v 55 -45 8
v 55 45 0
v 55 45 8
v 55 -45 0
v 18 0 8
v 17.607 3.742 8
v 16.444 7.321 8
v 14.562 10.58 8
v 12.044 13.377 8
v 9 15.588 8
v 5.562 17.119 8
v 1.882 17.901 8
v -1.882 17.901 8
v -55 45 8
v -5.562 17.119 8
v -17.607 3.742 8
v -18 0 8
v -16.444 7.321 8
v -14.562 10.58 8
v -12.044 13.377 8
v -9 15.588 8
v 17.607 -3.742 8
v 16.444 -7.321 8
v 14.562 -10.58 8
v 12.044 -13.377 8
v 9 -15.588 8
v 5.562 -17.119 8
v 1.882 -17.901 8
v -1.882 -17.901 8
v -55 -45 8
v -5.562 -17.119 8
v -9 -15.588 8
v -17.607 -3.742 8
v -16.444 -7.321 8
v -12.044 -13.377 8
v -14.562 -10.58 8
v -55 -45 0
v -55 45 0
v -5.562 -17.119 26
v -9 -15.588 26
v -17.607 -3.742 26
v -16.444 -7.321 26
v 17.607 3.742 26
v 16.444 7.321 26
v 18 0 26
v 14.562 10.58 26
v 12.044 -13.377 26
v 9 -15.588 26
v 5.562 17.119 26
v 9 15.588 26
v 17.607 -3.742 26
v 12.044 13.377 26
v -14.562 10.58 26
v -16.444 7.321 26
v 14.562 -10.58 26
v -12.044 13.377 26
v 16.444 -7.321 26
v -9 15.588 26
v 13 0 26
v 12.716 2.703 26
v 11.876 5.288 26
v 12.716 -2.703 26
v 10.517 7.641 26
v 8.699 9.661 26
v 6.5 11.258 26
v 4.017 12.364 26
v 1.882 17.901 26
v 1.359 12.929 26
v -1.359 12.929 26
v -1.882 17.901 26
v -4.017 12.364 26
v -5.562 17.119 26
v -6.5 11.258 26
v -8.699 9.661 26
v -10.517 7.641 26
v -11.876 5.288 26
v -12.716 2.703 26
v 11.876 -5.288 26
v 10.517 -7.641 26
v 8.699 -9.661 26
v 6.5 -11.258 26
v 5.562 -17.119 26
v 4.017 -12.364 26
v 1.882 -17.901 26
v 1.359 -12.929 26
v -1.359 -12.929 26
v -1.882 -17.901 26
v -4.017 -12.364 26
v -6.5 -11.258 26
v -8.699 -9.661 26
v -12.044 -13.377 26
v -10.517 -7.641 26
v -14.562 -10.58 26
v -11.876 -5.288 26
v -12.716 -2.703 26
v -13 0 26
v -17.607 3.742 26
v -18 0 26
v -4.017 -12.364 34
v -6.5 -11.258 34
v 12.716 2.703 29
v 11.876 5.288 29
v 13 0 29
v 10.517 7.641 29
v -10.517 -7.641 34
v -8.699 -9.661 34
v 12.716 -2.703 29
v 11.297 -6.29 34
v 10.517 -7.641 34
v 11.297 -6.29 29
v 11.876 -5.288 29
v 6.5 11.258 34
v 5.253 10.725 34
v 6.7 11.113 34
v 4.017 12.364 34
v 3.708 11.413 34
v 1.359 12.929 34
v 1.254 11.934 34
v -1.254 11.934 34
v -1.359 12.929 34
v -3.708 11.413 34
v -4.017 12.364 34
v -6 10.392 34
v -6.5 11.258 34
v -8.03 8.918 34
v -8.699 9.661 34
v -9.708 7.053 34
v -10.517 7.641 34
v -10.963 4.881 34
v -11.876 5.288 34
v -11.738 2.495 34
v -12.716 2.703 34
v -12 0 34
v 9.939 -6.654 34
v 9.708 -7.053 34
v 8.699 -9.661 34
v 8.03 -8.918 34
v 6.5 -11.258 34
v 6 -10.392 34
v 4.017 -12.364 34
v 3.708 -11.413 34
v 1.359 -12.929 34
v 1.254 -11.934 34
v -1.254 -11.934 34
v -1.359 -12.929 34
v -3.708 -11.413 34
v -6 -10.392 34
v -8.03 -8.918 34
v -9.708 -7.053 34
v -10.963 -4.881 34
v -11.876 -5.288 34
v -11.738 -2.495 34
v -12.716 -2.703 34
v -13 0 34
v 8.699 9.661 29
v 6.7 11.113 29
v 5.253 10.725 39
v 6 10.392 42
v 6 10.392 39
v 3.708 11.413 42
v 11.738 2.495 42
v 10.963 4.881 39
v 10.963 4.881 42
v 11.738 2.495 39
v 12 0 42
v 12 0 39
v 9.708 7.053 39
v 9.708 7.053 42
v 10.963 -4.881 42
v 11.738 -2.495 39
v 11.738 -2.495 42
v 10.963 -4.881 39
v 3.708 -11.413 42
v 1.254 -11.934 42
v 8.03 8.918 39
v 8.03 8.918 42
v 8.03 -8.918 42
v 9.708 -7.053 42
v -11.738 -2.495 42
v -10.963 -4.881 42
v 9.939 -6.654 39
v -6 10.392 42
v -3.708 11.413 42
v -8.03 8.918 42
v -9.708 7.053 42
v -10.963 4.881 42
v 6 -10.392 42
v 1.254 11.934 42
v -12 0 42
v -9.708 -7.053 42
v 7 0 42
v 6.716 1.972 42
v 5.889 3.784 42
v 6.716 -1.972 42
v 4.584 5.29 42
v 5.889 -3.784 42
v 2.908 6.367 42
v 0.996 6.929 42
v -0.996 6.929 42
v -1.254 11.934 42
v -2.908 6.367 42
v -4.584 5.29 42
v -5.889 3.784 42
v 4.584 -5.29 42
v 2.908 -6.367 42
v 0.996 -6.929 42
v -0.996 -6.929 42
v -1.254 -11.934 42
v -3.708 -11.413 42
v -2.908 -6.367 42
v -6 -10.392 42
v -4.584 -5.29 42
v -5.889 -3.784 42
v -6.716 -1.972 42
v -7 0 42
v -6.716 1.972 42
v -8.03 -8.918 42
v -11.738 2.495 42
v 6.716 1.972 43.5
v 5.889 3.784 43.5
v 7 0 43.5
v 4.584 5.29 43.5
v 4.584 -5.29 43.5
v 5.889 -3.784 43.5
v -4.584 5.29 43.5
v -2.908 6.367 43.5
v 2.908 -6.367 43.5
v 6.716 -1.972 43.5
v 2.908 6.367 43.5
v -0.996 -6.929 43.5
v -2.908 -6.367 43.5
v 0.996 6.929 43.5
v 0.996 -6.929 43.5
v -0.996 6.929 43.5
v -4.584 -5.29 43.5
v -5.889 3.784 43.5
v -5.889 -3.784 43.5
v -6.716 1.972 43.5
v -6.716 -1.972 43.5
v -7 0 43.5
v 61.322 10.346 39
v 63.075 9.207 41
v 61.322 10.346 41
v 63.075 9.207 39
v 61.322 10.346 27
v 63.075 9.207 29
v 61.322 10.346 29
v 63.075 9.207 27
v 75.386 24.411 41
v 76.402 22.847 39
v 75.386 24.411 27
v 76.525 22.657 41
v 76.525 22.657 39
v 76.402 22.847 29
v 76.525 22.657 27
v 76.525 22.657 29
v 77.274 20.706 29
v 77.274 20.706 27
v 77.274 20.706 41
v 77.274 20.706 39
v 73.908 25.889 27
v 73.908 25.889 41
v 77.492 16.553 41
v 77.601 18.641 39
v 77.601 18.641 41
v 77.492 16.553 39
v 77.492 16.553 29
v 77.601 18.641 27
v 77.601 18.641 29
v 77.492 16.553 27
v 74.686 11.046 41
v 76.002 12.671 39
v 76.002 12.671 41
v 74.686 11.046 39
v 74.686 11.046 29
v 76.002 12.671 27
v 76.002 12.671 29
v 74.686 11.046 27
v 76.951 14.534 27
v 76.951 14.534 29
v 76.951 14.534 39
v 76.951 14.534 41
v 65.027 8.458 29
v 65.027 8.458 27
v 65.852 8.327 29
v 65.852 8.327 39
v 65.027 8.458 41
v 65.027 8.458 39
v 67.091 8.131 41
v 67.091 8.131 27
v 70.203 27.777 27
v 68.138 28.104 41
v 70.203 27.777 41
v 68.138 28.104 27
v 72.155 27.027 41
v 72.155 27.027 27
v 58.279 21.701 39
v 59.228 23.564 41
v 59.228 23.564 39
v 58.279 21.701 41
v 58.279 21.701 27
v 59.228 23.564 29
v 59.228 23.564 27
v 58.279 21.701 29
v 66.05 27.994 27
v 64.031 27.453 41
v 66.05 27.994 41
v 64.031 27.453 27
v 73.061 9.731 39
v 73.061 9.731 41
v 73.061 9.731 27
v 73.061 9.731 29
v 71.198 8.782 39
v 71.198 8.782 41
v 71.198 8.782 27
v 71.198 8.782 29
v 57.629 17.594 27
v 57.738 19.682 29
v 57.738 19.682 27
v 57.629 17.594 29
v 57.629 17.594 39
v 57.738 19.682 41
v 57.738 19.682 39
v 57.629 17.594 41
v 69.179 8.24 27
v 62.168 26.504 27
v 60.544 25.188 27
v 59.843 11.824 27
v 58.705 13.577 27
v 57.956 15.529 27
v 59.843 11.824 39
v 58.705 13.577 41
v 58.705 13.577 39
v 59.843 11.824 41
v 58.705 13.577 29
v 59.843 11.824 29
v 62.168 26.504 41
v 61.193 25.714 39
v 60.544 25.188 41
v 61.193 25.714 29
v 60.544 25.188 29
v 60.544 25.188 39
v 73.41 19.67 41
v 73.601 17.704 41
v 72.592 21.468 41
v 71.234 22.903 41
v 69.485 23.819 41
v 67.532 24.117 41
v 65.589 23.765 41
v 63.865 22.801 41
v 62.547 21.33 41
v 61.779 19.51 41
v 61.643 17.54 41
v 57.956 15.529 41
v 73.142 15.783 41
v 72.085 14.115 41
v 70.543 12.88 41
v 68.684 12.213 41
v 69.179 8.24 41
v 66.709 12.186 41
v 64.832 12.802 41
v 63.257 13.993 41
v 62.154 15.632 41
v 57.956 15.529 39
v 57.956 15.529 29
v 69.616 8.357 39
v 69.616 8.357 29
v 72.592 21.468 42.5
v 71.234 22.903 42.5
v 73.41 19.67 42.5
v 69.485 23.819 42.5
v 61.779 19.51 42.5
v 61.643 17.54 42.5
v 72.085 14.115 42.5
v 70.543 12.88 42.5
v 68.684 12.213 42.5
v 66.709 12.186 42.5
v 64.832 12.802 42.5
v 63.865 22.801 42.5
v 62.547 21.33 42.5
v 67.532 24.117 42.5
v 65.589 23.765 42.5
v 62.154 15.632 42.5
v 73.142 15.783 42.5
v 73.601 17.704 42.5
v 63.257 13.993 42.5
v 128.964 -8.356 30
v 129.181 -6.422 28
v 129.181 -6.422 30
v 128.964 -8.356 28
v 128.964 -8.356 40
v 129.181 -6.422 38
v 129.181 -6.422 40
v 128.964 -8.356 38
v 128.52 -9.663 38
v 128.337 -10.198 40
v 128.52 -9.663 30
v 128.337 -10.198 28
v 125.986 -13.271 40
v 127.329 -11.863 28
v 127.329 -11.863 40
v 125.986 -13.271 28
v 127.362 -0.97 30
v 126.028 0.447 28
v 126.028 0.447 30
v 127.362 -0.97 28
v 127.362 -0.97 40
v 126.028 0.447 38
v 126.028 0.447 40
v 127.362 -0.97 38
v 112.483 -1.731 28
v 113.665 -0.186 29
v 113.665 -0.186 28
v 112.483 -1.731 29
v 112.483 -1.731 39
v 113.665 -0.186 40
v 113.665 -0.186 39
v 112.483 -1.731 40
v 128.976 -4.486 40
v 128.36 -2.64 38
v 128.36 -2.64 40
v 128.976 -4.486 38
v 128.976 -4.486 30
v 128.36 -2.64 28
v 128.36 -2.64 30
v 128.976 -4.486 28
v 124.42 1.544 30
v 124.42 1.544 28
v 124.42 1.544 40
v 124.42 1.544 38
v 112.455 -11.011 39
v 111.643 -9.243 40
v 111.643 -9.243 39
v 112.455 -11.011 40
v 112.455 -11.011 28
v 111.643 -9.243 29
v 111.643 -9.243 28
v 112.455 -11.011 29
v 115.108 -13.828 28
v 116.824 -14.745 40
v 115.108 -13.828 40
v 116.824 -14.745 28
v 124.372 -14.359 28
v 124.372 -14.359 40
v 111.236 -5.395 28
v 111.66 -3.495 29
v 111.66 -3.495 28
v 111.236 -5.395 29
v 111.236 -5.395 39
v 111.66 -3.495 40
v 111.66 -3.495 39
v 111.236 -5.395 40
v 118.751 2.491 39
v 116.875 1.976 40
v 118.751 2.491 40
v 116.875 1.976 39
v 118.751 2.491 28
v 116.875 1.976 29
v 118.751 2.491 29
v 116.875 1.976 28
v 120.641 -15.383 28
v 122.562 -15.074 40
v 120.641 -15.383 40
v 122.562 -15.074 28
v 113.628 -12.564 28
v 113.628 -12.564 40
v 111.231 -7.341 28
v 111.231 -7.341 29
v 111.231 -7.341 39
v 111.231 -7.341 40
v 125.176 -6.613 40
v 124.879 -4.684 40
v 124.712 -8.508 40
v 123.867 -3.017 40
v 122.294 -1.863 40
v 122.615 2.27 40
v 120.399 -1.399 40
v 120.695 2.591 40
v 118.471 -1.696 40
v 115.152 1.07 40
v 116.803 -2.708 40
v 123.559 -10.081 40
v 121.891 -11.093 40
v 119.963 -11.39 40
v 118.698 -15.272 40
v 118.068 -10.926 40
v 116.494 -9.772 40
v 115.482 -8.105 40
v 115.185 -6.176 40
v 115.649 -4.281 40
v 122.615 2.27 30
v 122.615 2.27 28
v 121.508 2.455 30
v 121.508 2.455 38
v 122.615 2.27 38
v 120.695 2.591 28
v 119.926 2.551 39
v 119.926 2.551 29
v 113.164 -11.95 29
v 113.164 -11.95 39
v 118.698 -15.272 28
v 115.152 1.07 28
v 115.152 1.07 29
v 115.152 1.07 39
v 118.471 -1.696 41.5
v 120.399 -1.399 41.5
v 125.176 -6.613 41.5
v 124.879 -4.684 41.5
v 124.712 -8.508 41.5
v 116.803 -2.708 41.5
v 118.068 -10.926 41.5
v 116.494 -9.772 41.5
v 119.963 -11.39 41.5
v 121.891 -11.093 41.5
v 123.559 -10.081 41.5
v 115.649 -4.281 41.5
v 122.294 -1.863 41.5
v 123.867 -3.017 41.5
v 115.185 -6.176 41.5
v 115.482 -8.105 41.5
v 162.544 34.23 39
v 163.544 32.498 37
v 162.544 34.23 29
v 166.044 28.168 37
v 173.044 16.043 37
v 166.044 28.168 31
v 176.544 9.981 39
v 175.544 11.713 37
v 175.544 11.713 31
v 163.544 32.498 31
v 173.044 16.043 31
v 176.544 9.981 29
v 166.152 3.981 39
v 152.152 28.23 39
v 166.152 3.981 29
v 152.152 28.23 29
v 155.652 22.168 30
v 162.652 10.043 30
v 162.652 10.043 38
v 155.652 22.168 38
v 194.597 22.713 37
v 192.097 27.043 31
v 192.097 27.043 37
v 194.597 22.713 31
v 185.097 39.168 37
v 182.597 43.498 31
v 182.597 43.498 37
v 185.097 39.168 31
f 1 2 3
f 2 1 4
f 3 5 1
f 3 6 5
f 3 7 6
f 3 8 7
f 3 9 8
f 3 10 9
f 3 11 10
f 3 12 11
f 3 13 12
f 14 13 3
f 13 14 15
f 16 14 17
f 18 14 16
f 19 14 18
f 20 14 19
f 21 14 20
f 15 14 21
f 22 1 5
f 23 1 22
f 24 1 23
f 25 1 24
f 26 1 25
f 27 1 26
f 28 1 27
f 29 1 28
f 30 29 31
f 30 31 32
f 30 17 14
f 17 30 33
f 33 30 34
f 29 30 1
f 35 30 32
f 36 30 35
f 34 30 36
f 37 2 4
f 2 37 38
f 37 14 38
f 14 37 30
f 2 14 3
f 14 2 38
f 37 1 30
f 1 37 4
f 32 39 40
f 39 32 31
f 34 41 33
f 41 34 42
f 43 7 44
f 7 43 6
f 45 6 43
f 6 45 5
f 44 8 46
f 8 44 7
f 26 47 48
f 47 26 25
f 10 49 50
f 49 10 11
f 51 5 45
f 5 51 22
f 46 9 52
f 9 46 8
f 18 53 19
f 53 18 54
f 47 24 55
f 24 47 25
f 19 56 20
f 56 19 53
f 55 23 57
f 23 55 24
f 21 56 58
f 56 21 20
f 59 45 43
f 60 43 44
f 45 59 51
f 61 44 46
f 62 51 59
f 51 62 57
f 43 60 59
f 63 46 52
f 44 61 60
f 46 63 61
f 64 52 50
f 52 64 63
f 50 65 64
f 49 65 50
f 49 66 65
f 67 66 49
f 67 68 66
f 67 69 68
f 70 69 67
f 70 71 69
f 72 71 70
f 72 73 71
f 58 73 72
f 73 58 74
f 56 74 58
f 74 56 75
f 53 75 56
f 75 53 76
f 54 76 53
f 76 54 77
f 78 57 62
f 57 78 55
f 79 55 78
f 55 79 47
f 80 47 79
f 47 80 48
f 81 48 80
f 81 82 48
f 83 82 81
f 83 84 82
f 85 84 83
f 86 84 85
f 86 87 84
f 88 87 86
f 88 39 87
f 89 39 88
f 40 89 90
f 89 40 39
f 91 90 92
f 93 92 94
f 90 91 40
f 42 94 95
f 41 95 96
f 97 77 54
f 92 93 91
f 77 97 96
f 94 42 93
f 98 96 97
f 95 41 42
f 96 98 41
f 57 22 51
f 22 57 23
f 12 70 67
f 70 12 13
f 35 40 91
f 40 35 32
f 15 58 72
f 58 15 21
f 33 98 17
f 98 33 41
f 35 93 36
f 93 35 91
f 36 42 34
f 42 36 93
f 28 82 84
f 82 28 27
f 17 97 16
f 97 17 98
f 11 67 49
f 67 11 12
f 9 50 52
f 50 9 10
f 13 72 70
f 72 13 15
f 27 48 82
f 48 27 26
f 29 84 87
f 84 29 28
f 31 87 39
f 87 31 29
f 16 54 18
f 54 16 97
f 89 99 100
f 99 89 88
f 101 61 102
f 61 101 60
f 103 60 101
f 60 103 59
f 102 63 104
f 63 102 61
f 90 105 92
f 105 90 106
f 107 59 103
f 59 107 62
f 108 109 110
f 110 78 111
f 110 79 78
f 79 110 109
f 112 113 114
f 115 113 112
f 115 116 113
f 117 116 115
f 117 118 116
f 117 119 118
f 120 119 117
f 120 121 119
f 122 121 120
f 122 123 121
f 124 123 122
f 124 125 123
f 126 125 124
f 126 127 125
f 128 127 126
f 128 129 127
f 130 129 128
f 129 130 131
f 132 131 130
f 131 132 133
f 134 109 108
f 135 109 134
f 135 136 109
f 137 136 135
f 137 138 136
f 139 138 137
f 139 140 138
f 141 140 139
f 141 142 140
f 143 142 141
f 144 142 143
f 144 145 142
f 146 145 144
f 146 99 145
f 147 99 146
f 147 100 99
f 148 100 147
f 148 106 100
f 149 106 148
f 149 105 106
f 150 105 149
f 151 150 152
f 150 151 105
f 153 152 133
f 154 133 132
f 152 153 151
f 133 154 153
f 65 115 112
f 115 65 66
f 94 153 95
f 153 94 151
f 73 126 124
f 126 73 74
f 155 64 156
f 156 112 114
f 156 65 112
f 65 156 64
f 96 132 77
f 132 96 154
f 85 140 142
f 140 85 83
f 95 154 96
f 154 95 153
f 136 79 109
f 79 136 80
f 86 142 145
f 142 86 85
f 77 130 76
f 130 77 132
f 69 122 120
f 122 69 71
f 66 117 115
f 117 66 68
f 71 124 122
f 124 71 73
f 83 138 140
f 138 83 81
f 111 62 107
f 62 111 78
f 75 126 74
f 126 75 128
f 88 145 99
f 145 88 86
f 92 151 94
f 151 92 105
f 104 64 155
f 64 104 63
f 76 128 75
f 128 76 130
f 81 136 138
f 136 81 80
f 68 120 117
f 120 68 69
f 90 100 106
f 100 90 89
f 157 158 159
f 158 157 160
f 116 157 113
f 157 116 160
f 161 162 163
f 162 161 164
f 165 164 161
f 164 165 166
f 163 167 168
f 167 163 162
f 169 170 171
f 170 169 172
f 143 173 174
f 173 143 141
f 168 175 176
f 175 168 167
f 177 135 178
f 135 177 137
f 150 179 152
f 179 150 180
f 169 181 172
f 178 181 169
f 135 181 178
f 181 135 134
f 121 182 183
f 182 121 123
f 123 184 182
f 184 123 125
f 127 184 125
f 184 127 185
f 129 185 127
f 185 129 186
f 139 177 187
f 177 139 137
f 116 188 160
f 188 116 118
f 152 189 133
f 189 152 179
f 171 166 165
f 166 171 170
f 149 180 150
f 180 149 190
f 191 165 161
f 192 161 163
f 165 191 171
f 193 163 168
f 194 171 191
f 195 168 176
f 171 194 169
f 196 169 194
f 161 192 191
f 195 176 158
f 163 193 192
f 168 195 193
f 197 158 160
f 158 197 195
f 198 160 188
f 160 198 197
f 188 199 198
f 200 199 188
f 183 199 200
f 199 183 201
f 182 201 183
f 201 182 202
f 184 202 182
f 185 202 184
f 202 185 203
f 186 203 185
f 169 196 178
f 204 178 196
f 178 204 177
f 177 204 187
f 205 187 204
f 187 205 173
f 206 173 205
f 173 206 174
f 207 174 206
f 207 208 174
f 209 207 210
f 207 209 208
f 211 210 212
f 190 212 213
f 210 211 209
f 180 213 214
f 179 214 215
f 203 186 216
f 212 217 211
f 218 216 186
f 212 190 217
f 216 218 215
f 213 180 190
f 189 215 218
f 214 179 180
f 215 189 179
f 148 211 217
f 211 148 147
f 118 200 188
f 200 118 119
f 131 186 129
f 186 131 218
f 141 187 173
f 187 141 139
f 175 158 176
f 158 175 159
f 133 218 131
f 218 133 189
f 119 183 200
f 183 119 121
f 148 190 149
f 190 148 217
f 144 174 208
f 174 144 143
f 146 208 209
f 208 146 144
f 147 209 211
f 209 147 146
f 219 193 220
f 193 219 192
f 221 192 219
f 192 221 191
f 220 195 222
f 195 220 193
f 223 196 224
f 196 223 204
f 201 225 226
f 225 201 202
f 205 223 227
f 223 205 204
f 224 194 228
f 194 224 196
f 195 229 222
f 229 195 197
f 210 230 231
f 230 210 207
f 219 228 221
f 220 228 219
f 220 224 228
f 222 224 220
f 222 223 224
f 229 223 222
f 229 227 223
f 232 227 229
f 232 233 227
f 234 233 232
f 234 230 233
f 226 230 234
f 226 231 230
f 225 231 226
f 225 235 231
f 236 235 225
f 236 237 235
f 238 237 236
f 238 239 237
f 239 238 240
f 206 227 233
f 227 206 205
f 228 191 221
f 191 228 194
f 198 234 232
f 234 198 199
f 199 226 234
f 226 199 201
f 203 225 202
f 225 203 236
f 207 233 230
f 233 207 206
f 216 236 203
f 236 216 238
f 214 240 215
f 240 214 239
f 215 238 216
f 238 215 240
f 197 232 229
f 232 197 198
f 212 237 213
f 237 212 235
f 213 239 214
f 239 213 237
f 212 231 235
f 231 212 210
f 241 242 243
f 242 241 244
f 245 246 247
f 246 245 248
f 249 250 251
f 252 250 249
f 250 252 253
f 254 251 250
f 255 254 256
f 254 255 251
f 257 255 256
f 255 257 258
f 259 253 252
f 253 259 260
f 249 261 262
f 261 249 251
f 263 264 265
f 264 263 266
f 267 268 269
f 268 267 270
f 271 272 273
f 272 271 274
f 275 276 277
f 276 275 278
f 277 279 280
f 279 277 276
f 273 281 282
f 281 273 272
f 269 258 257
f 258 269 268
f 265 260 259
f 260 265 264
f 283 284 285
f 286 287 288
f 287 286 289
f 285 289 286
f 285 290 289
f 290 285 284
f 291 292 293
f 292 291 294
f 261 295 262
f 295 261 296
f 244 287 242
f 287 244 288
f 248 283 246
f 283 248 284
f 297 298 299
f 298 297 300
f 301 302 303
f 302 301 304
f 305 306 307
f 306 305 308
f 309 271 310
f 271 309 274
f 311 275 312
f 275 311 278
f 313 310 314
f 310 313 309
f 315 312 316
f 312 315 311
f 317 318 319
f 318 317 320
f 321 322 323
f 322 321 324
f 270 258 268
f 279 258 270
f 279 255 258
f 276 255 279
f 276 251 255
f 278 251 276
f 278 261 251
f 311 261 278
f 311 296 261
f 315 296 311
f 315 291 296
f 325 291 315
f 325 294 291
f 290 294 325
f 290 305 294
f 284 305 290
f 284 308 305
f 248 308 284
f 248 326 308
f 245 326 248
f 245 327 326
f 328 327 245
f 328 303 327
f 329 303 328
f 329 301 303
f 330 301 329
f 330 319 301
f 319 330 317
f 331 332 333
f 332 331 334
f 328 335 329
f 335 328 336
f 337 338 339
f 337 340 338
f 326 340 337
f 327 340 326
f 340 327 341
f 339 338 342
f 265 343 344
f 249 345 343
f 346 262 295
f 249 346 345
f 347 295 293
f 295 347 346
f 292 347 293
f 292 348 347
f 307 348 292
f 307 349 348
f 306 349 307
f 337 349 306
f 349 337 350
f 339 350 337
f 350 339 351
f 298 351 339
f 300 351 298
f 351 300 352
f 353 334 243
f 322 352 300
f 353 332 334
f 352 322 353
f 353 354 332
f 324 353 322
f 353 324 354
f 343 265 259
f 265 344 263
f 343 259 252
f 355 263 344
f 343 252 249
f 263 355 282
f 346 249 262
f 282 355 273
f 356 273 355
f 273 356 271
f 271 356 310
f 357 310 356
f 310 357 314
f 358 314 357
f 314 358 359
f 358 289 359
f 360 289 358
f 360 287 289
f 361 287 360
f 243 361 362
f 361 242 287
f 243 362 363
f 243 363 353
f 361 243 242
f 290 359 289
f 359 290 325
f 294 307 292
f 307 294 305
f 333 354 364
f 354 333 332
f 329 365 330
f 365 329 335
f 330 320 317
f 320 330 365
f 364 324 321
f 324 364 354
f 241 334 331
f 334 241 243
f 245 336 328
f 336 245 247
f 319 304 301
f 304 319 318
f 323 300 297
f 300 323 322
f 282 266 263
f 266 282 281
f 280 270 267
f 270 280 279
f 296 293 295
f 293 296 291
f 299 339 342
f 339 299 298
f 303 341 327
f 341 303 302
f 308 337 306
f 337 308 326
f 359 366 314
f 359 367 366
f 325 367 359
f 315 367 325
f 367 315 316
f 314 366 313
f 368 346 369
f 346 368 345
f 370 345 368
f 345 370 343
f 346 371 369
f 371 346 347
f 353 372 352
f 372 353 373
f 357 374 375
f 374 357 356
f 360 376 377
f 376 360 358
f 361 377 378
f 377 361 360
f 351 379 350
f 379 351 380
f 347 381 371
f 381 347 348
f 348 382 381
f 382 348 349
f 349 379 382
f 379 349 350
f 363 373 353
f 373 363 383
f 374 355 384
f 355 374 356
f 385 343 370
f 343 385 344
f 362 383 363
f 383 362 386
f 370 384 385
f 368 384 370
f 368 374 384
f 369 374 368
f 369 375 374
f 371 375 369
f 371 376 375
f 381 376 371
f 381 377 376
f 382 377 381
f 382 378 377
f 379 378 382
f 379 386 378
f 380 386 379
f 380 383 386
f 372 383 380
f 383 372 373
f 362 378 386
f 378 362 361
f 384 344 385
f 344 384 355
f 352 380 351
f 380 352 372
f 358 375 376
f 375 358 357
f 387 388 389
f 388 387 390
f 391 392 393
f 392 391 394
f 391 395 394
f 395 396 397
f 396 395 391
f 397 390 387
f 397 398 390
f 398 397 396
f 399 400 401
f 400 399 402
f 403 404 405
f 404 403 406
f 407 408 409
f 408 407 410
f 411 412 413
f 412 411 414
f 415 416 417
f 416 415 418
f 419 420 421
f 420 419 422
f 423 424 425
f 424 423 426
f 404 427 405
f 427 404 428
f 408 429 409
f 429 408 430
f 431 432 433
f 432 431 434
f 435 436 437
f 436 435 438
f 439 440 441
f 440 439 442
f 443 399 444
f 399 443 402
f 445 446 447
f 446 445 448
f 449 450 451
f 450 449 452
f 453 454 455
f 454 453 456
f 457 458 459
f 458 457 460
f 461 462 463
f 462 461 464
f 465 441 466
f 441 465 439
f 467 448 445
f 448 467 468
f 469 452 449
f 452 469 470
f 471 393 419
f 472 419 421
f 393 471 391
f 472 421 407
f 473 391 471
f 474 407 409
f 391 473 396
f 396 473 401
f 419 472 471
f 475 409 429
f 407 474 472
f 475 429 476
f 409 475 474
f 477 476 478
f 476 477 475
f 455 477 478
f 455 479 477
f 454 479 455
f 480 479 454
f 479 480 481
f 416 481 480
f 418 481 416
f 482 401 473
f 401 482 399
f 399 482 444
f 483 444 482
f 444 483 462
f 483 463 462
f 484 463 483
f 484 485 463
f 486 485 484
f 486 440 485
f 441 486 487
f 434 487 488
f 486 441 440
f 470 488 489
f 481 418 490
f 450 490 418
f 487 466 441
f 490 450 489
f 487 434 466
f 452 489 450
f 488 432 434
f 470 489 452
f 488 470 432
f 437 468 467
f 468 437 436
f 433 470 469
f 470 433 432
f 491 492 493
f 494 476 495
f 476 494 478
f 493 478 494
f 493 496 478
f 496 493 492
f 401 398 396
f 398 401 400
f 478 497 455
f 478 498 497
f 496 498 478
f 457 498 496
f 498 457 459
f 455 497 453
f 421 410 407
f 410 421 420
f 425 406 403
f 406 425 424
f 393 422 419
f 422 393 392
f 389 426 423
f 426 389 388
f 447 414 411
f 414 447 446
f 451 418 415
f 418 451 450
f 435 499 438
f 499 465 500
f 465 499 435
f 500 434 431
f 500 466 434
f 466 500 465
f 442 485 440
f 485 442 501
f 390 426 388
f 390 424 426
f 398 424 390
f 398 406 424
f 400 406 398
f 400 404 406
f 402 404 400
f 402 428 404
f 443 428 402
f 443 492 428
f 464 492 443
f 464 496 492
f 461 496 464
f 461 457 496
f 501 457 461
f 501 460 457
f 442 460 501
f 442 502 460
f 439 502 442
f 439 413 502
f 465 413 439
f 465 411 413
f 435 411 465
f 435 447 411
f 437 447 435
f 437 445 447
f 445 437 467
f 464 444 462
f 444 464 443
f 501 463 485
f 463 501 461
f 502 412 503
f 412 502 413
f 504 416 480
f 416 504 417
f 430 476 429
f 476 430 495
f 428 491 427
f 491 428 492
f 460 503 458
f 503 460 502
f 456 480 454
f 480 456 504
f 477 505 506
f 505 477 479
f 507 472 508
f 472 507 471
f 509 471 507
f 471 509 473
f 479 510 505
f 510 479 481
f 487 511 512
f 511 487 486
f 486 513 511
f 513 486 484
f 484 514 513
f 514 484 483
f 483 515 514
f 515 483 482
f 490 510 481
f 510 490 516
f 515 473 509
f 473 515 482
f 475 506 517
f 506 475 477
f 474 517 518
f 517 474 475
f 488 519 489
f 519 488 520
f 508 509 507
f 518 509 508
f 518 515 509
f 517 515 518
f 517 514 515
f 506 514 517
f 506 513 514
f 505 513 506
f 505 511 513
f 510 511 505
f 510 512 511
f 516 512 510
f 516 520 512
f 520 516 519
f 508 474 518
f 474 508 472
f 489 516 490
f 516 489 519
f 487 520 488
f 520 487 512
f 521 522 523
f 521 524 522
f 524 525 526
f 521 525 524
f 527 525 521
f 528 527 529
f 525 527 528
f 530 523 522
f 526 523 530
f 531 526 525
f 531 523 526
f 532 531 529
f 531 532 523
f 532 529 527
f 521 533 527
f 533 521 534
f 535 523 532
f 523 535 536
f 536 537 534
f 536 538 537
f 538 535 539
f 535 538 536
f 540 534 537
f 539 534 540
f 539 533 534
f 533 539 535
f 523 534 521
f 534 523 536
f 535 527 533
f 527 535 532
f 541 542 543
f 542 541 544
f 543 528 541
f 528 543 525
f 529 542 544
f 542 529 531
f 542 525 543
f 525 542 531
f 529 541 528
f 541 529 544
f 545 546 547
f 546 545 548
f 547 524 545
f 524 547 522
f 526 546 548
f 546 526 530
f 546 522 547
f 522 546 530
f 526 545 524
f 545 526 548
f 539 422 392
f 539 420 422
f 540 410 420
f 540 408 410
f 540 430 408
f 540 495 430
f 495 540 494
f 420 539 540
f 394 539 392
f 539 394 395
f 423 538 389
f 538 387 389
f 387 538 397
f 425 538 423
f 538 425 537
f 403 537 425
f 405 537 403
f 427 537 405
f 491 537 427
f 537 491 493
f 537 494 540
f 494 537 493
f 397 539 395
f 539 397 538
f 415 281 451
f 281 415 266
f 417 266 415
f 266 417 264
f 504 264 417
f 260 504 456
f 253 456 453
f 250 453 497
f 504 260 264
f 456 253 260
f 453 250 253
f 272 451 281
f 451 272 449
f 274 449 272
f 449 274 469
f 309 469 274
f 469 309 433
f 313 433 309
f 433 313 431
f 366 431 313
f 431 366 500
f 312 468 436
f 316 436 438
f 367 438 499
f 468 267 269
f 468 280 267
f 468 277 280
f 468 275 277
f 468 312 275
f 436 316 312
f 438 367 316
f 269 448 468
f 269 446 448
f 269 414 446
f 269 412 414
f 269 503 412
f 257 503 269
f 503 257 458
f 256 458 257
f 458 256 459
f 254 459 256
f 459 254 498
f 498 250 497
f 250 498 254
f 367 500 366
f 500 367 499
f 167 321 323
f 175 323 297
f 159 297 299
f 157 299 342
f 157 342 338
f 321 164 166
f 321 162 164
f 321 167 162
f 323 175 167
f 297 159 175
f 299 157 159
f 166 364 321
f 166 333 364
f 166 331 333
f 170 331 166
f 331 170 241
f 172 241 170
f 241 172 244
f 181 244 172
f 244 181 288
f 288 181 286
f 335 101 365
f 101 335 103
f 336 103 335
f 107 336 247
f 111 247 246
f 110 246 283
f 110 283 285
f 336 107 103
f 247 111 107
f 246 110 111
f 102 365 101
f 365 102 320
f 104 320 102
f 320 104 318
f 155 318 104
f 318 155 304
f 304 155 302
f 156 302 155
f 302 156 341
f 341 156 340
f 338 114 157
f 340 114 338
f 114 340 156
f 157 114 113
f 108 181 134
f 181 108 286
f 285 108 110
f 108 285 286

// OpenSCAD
module base() {
    translate([-55, -45, 0])
        cube([110, 90, 8]);
    translate([0, 0, 8])
        cylinder(r=18, h=18);
    translate([0, 0, 26])
        cylinder(r=13, h=8);
}

module link1() {
    translate([0, -9, -5])
        cube([70, 18, 10]);
}

module link2() {
    translate([0, -8, -5])
        cube([58, 16, 10]);
}

module link3() {
    translate([0, -7, -4])
        cube([45, 14, 8]);
}

module joint1() {
    cylinder(r=12, h=16, center=true);
    translate([0, 0, 8])
        cylinder(r=7, h=3, center=true);
}

module joint2() {
    cylinder(r=10, h=14, center=true);
    translate([0, 0, 7])
        cylinder(r=6, h=3, center=true);
}

module joint3() {
    cylinder(r=9, h=12, center=true);
    translate([0, 0, 6])
        cylinder(r=5, h=3, center=true);
}

module gripper() {
    translate([0, -14, -5])
        cube([12, 28, 10]);
    translate([10, -12, -3])
        cube([24, 5, 6]);
    translate([10, 7, -3])
        cube([24, 5, 6]);
}

base();

translate([0, 0, 34])
    joint1();

translate([0, 0, 34])
rotate([0, 0, 15]) {
    link1();
    translate([70, 0, 0]) {
        joint2();
        rotate([0, 0, -40]) {
            link2();
            translate([58, 0, 0]) {
                joint3();
                rotate([0, 0, 55]) {
                    link3();
                    translate([45, 0, 0])
                        gripper();
                }
            }
        }
    }
}
